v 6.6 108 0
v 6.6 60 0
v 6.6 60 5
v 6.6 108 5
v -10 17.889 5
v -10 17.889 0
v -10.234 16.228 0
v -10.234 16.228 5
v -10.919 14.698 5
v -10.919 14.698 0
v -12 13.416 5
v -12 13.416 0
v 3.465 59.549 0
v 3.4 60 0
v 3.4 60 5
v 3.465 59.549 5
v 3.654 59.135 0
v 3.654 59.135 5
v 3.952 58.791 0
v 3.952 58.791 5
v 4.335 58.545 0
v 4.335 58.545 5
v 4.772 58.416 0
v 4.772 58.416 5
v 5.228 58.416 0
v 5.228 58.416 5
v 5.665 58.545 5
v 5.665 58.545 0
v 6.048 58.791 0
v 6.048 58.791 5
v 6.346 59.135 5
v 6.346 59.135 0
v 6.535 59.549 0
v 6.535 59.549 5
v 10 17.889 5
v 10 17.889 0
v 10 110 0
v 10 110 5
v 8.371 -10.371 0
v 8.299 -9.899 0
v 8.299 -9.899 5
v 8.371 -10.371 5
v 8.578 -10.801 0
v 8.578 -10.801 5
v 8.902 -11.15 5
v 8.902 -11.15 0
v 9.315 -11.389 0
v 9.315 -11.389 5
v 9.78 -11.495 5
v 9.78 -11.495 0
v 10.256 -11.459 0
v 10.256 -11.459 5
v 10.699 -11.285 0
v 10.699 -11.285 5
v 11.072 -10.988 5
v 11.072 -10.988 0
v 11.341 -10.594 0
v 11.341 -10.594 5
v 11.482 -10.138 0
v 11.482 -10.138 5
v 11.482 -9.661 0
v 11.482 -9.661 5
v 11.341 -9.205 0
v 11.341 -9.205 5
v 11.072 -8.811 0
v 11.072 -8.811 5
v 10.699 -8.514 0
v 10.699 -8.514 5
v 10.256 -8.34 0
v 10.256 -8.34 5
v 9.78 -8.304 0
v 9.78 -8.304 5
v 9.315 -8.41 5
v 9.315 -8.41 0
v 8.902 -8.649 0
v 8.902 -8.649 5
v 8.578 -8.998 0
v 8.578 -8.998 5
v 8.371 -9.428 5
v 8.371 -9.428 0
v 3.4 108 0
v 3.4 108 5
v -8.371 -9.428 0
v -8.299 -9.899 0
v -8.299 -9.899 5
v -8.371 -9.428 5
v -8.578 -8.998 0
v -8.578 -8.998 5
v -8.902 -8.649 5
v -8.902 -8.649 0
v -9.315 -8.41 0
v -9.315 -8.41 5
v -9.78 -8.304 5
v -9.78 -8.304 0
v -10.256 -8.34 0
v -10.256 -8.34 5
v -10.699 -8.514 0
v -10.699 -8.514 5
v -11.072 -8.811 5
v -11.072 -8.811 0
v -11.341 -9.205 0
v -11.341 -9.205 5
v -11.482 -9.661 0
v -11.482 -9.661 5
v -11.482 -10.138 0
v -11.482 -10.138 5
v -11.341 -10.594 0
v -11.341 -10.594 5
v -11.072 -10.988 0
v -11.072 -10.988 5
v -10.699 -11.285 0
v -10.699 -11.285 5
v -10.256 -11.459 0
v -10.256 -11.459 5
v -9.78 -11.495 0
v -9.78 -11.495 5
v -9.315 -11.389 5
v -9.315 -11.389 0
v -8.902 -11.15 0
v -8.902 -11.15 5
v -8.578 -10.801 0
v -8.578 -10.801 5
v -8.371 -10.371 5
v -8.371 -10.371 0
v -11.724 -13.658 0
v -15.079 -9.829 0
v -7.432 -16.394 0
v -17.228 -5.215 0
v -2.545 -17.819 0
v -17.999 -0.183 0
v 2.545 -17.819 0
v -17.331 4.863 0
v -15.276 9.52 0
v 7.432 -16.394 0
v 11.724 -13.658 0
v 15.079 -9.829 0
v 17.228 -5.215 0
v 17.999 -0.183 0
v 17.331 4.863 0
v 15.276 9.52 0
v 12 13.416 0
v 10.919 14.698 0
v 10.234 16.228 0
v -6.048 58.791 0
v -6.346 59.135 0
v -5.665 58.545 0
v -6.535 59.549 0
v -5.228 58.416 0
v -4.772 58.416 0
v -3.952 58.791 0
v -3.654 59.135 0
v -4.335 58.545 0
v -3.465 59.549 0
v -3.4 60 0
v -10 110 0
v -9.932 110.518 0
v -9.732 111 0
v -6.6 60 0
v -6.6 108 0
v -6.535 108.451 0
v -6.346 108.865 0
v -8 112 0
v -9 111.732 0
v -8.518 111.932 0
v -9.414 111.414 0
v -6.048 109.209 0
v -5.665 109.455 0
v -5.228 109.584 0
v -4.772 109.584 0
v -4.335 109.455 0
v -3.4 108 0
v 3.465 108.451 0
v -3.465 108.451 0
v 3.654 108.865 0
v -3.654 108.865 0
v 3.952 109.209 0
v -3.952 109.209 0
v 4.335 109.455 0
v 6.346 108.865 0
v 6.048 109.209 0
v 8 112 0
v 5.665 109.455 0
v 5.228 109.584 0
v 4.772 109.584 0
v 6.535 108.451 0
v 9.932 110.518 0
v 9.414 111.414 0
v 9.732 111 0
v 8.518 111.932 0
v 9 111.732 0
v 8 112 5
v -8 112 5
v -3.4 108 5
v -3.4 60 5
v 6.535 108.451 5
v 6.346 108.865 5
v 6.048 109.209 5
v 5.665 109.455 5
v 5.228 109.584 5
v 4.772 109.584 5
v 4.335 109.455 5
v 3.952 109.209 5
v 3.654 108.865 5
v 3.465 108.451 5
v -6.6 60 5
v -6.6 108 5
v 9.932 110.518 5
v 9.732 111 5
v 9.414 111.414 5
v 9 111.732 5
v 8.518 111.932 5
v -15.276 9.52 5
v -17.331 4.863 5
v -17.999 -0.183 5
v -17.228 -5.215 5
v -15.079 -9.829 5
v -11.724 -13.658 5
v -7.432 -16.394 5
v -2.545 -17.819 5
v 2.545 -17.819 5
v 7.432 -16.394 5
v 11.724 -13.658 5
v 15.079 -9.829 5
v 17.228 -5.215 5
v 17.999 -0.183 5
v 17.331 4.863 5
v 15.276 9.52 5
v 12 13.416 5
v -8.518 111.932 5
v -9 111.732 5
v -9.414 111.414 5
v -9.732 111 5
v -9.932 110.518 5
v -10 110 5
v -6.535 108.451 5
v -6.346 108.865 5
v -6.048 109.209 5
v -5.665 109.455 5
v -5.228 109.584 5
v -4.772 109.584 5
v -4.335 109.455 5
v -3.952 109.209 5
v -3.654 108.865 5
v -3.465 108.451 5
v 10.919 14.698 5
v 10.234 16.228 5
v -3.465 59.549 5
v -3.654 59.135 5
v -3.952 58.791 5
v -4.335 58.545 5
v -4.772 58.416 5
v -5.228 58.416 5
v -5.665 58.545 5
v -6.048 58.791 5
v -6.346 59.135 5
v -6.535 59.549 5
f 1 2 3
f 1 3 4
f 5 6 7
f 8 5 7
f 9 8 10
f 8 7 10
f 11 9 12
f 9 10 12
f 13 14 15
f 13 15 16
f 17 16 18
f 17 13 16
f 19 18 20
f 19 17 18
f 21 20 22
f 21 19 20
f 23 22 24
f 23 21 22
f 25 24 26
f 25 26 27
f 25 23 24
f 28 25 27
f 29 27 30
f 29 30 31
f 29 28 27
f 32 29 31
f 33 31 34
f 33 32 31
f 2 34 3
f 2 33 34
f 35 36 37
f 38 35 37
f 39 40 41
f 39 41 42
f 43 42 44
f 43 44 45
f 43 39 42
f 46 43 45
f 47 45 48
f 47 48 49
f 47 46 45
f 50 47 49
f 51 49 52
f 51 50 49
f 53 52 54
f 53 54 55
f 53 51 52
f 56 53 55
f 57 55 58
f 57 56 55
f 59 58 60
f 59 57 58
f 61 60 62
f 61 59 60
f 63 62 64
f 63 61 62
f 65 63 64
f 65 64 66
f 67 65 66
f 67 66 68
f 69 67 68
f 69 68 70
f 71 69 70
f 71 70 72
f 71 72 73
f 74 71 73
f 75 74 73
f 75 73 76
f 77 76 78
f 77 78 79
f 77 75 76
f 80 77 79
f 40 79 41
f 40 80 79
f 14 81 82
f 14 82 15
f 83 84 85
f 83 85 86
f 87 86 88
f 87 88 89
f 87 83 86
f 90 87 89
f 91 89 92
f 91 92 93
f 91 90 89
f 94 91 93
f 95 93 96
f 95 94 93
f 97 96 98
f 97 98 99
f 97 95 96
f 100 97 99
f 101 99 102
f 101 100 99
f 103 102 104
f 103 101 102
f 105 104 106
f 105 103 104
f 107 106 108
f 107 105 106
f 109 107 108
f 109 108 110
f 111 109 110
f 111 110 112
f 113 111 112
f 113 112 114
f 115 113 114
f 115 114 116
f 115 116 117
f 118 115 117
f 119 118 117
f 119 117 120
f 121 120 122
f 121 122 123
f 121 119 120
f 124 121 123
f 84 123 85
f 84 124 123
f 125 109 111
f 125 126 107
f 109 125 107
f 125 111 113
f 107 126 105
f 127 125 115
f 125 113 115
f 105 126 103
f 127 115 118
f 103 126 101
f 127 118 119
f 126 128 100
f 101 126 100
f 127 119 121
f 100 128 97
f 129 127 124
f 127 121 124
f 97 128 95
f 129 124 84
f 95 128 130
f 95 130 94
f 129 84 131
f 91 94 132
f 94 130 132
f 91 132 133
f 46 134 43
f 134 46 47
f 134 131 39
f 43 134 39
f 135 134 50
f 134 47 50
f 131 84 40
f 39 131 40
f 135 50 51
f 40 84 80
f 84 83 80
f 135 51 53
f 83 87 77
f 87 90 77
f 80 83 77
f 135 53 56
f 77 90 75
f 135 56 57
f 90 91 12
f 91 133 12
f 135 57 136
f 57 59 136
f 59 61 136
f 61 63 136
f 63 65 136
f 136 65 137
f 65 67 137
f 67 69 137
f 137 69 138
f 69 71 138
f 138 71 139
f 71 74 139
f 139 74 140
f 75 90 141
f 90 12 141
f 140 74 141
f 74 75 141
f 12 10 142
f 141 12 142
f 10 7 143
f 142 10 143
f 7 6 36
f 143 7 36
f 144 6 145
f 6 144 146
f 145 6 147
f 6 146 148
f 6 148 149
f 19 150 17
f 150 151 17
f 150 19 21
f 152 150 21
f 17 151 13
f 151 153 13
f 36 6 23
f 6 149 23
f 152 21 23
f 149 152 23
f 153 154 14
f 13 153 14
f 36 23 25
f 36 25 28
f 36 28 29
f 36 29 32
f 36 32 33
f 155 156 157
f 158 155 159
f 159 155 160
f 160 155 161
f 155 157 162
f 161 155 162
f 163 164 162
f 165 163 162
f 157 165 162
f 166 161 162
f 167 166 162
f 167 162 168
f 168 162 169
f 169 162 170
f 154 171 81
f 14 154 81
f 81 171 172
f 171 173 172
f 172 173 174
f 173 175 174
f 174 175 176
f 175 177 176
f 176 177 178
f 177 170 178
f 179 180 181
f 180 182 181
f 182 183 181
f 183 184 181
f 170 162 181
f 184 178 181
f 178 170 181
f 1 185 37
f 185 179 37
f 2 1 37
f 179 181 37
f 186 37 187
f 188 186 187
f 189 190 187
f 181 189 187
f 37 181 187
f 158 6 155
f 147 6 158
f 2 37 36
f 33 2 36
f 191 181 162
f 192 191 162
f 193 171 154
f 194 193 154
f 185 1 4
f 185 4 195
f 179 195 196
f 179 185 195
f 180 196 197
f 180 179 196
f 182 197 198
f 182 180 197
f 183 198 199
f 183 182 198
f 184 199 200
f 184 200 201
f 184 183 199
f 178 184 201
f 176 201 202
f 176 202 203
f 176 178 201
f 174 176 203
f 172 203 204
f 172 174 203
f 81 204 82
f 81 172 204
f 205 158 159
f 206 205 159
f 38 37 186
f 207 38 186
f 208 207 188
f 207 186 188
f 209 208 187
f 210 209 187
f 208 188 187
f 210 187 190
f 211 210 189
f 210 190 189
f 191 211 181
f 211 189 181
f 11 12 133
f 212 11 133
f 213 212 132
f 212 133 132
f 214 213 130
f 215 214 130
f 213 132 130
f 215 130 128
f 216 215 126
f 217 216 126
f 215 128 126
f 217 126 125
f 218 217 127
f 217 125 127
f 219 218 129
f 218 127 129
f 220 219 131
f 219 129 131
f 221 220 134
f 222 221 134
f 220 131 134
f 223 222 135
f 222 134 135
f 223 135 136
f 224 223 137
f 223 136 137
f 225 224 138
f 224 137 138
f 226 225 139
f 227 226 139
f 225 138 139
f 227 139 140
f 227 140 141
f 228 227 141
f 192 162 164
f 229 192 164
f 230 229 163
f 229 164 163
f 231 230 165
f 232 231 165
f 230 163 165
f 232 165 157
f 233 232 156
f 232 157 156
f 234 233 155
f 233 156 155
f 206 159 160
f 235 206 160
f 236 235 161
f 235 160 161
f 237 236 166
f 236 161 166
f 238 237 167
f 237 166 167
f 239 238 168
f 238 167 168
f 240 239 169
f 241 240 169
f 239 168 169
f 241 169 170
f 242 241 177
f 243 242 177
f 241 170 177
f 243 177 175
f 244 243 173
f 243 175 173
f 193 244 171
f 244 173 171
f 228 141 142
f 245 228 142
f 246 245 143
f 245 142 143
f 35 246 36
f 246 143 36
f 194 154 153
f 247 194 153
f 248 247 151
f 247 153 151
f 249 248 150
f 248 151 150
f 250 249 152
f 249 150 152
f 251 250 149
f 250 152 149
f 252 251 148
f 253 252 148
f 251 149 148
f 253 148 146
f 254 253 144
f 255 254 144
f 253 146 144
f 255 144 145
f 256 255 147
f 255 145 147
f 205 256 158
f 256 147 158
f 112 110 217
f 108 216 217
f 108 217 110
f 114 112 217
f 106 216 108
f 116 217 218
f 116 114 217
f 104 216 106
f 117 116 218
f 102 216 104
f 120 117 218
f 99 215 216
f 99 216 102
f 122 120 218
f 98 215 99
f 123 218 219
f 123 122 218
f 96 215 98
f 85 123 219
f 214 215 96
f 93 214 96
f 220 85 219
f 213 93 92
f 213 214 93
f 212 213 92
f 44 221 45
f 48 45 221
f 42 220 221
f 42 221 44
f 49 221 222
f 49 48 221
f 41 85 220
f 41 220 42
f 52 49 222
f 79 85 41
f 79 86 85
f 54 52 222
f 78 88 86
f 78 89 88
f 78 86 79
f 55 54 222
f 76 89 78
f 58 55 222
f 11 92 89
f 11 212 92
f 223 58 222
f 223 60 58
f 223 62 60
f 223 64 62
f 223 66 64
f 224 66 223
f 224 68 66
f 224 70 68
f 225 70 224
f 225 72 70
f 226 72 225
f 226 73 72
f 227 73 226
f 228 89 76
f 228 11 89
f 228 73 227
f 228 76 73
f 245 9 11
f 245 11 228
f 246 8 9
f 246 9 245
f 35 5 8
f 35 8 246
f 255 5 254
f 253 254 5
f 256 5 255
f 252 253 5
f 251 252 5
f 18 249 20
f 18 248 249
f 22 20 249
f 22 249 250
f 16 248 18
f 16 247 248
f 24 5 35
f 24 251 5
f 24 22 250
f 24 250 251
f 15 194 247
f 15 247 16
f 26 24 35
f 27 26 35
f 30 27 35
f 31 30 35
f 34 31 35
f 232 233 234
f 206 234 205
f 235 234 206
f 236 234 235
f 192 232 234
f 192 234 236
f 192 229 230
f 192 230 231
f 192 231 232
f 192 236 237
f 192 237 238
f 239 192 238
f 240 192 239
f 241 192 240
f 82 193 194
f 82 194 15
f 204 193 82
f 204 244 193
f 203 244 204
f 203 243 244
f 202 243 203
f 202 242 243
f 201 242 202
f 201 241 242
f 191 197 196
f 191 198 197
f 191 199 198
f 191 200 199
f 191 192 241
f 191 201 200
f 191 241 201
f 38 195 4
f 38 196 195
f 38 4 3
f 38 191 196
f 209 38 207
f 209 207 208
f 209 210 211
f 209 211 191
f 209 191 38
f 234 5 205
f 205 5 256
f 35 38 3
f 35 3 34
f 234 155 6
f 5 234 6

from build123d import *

# Parameters (mm, degrees)
SKETCH_1_R      = 1.6
EXTRUDE_1_DEPTH = 5


with BuildPart() as part:
    # 草图1 → 凸台-拉伸1 (new body)
    with BuildSketch(Plane.XY):
        with BuildLine():
            Line((-10, 110), (-10, 17.88854382))
            ThreePointArc((-10, 17.88854382), (-10.522774425, 15.439054077), (-12, 13.416407865))
            ThreePointArc((-12, 13.416407865), (0, -18), (12, 13.416407865))
            ThreePointArc((12, 13.416407865), (10.522774425, 15.439054077), (10, 17.88854382))
            Line((10, 17.88854382), (10, 110))
            ThreePointArc((10, 110), (9.414213562, 111.414213562), (8, 112))
            Line((8, 112), (-8, 112))
            ThreePointArc((-8, 112), (-9.414213562, 111.414213562), (-10, 110))
        make_face()
        with Locations((-9.899494937, -9.899494937)):
            Circle(SKETCH_1_R, mode=Mode.SUBTRACT)
        with Locations(Location((9.899494937, -9.899494937, 0), (0, 0, 180))):
            Circle(SKETCH_1_R, mode=Mode.SUBTRACT)
        with BuildLine():
            Line((-3.4, 108), (-3.4, 60))
            ThreePointArc((-3.4, 60), (-5, 58.4), (-6.6, 60))
            Line((-6.6, 60), (-6.6, 108))
            ThreePointArc((-6.6, 108), (-5, 109.6), (-3.4, 108))
        make_face(mode=Mode.SUBTRACT)
        with BuildLine():
            Line((3.4, 108), (3.4, 60))
            ThreePointArc((3.4, 60), (5, 58.4), (6.6, 60))
            Line((6.6, 60), (6.6, 108))
            ThreePointArc((6.6, 108), (5, 109.6), (3.4, 108))
        make_face(mode=Mode.SUBTRACT)
    extrude(amount=EXTRUDE_1_DEPTH)


solid = part.part
